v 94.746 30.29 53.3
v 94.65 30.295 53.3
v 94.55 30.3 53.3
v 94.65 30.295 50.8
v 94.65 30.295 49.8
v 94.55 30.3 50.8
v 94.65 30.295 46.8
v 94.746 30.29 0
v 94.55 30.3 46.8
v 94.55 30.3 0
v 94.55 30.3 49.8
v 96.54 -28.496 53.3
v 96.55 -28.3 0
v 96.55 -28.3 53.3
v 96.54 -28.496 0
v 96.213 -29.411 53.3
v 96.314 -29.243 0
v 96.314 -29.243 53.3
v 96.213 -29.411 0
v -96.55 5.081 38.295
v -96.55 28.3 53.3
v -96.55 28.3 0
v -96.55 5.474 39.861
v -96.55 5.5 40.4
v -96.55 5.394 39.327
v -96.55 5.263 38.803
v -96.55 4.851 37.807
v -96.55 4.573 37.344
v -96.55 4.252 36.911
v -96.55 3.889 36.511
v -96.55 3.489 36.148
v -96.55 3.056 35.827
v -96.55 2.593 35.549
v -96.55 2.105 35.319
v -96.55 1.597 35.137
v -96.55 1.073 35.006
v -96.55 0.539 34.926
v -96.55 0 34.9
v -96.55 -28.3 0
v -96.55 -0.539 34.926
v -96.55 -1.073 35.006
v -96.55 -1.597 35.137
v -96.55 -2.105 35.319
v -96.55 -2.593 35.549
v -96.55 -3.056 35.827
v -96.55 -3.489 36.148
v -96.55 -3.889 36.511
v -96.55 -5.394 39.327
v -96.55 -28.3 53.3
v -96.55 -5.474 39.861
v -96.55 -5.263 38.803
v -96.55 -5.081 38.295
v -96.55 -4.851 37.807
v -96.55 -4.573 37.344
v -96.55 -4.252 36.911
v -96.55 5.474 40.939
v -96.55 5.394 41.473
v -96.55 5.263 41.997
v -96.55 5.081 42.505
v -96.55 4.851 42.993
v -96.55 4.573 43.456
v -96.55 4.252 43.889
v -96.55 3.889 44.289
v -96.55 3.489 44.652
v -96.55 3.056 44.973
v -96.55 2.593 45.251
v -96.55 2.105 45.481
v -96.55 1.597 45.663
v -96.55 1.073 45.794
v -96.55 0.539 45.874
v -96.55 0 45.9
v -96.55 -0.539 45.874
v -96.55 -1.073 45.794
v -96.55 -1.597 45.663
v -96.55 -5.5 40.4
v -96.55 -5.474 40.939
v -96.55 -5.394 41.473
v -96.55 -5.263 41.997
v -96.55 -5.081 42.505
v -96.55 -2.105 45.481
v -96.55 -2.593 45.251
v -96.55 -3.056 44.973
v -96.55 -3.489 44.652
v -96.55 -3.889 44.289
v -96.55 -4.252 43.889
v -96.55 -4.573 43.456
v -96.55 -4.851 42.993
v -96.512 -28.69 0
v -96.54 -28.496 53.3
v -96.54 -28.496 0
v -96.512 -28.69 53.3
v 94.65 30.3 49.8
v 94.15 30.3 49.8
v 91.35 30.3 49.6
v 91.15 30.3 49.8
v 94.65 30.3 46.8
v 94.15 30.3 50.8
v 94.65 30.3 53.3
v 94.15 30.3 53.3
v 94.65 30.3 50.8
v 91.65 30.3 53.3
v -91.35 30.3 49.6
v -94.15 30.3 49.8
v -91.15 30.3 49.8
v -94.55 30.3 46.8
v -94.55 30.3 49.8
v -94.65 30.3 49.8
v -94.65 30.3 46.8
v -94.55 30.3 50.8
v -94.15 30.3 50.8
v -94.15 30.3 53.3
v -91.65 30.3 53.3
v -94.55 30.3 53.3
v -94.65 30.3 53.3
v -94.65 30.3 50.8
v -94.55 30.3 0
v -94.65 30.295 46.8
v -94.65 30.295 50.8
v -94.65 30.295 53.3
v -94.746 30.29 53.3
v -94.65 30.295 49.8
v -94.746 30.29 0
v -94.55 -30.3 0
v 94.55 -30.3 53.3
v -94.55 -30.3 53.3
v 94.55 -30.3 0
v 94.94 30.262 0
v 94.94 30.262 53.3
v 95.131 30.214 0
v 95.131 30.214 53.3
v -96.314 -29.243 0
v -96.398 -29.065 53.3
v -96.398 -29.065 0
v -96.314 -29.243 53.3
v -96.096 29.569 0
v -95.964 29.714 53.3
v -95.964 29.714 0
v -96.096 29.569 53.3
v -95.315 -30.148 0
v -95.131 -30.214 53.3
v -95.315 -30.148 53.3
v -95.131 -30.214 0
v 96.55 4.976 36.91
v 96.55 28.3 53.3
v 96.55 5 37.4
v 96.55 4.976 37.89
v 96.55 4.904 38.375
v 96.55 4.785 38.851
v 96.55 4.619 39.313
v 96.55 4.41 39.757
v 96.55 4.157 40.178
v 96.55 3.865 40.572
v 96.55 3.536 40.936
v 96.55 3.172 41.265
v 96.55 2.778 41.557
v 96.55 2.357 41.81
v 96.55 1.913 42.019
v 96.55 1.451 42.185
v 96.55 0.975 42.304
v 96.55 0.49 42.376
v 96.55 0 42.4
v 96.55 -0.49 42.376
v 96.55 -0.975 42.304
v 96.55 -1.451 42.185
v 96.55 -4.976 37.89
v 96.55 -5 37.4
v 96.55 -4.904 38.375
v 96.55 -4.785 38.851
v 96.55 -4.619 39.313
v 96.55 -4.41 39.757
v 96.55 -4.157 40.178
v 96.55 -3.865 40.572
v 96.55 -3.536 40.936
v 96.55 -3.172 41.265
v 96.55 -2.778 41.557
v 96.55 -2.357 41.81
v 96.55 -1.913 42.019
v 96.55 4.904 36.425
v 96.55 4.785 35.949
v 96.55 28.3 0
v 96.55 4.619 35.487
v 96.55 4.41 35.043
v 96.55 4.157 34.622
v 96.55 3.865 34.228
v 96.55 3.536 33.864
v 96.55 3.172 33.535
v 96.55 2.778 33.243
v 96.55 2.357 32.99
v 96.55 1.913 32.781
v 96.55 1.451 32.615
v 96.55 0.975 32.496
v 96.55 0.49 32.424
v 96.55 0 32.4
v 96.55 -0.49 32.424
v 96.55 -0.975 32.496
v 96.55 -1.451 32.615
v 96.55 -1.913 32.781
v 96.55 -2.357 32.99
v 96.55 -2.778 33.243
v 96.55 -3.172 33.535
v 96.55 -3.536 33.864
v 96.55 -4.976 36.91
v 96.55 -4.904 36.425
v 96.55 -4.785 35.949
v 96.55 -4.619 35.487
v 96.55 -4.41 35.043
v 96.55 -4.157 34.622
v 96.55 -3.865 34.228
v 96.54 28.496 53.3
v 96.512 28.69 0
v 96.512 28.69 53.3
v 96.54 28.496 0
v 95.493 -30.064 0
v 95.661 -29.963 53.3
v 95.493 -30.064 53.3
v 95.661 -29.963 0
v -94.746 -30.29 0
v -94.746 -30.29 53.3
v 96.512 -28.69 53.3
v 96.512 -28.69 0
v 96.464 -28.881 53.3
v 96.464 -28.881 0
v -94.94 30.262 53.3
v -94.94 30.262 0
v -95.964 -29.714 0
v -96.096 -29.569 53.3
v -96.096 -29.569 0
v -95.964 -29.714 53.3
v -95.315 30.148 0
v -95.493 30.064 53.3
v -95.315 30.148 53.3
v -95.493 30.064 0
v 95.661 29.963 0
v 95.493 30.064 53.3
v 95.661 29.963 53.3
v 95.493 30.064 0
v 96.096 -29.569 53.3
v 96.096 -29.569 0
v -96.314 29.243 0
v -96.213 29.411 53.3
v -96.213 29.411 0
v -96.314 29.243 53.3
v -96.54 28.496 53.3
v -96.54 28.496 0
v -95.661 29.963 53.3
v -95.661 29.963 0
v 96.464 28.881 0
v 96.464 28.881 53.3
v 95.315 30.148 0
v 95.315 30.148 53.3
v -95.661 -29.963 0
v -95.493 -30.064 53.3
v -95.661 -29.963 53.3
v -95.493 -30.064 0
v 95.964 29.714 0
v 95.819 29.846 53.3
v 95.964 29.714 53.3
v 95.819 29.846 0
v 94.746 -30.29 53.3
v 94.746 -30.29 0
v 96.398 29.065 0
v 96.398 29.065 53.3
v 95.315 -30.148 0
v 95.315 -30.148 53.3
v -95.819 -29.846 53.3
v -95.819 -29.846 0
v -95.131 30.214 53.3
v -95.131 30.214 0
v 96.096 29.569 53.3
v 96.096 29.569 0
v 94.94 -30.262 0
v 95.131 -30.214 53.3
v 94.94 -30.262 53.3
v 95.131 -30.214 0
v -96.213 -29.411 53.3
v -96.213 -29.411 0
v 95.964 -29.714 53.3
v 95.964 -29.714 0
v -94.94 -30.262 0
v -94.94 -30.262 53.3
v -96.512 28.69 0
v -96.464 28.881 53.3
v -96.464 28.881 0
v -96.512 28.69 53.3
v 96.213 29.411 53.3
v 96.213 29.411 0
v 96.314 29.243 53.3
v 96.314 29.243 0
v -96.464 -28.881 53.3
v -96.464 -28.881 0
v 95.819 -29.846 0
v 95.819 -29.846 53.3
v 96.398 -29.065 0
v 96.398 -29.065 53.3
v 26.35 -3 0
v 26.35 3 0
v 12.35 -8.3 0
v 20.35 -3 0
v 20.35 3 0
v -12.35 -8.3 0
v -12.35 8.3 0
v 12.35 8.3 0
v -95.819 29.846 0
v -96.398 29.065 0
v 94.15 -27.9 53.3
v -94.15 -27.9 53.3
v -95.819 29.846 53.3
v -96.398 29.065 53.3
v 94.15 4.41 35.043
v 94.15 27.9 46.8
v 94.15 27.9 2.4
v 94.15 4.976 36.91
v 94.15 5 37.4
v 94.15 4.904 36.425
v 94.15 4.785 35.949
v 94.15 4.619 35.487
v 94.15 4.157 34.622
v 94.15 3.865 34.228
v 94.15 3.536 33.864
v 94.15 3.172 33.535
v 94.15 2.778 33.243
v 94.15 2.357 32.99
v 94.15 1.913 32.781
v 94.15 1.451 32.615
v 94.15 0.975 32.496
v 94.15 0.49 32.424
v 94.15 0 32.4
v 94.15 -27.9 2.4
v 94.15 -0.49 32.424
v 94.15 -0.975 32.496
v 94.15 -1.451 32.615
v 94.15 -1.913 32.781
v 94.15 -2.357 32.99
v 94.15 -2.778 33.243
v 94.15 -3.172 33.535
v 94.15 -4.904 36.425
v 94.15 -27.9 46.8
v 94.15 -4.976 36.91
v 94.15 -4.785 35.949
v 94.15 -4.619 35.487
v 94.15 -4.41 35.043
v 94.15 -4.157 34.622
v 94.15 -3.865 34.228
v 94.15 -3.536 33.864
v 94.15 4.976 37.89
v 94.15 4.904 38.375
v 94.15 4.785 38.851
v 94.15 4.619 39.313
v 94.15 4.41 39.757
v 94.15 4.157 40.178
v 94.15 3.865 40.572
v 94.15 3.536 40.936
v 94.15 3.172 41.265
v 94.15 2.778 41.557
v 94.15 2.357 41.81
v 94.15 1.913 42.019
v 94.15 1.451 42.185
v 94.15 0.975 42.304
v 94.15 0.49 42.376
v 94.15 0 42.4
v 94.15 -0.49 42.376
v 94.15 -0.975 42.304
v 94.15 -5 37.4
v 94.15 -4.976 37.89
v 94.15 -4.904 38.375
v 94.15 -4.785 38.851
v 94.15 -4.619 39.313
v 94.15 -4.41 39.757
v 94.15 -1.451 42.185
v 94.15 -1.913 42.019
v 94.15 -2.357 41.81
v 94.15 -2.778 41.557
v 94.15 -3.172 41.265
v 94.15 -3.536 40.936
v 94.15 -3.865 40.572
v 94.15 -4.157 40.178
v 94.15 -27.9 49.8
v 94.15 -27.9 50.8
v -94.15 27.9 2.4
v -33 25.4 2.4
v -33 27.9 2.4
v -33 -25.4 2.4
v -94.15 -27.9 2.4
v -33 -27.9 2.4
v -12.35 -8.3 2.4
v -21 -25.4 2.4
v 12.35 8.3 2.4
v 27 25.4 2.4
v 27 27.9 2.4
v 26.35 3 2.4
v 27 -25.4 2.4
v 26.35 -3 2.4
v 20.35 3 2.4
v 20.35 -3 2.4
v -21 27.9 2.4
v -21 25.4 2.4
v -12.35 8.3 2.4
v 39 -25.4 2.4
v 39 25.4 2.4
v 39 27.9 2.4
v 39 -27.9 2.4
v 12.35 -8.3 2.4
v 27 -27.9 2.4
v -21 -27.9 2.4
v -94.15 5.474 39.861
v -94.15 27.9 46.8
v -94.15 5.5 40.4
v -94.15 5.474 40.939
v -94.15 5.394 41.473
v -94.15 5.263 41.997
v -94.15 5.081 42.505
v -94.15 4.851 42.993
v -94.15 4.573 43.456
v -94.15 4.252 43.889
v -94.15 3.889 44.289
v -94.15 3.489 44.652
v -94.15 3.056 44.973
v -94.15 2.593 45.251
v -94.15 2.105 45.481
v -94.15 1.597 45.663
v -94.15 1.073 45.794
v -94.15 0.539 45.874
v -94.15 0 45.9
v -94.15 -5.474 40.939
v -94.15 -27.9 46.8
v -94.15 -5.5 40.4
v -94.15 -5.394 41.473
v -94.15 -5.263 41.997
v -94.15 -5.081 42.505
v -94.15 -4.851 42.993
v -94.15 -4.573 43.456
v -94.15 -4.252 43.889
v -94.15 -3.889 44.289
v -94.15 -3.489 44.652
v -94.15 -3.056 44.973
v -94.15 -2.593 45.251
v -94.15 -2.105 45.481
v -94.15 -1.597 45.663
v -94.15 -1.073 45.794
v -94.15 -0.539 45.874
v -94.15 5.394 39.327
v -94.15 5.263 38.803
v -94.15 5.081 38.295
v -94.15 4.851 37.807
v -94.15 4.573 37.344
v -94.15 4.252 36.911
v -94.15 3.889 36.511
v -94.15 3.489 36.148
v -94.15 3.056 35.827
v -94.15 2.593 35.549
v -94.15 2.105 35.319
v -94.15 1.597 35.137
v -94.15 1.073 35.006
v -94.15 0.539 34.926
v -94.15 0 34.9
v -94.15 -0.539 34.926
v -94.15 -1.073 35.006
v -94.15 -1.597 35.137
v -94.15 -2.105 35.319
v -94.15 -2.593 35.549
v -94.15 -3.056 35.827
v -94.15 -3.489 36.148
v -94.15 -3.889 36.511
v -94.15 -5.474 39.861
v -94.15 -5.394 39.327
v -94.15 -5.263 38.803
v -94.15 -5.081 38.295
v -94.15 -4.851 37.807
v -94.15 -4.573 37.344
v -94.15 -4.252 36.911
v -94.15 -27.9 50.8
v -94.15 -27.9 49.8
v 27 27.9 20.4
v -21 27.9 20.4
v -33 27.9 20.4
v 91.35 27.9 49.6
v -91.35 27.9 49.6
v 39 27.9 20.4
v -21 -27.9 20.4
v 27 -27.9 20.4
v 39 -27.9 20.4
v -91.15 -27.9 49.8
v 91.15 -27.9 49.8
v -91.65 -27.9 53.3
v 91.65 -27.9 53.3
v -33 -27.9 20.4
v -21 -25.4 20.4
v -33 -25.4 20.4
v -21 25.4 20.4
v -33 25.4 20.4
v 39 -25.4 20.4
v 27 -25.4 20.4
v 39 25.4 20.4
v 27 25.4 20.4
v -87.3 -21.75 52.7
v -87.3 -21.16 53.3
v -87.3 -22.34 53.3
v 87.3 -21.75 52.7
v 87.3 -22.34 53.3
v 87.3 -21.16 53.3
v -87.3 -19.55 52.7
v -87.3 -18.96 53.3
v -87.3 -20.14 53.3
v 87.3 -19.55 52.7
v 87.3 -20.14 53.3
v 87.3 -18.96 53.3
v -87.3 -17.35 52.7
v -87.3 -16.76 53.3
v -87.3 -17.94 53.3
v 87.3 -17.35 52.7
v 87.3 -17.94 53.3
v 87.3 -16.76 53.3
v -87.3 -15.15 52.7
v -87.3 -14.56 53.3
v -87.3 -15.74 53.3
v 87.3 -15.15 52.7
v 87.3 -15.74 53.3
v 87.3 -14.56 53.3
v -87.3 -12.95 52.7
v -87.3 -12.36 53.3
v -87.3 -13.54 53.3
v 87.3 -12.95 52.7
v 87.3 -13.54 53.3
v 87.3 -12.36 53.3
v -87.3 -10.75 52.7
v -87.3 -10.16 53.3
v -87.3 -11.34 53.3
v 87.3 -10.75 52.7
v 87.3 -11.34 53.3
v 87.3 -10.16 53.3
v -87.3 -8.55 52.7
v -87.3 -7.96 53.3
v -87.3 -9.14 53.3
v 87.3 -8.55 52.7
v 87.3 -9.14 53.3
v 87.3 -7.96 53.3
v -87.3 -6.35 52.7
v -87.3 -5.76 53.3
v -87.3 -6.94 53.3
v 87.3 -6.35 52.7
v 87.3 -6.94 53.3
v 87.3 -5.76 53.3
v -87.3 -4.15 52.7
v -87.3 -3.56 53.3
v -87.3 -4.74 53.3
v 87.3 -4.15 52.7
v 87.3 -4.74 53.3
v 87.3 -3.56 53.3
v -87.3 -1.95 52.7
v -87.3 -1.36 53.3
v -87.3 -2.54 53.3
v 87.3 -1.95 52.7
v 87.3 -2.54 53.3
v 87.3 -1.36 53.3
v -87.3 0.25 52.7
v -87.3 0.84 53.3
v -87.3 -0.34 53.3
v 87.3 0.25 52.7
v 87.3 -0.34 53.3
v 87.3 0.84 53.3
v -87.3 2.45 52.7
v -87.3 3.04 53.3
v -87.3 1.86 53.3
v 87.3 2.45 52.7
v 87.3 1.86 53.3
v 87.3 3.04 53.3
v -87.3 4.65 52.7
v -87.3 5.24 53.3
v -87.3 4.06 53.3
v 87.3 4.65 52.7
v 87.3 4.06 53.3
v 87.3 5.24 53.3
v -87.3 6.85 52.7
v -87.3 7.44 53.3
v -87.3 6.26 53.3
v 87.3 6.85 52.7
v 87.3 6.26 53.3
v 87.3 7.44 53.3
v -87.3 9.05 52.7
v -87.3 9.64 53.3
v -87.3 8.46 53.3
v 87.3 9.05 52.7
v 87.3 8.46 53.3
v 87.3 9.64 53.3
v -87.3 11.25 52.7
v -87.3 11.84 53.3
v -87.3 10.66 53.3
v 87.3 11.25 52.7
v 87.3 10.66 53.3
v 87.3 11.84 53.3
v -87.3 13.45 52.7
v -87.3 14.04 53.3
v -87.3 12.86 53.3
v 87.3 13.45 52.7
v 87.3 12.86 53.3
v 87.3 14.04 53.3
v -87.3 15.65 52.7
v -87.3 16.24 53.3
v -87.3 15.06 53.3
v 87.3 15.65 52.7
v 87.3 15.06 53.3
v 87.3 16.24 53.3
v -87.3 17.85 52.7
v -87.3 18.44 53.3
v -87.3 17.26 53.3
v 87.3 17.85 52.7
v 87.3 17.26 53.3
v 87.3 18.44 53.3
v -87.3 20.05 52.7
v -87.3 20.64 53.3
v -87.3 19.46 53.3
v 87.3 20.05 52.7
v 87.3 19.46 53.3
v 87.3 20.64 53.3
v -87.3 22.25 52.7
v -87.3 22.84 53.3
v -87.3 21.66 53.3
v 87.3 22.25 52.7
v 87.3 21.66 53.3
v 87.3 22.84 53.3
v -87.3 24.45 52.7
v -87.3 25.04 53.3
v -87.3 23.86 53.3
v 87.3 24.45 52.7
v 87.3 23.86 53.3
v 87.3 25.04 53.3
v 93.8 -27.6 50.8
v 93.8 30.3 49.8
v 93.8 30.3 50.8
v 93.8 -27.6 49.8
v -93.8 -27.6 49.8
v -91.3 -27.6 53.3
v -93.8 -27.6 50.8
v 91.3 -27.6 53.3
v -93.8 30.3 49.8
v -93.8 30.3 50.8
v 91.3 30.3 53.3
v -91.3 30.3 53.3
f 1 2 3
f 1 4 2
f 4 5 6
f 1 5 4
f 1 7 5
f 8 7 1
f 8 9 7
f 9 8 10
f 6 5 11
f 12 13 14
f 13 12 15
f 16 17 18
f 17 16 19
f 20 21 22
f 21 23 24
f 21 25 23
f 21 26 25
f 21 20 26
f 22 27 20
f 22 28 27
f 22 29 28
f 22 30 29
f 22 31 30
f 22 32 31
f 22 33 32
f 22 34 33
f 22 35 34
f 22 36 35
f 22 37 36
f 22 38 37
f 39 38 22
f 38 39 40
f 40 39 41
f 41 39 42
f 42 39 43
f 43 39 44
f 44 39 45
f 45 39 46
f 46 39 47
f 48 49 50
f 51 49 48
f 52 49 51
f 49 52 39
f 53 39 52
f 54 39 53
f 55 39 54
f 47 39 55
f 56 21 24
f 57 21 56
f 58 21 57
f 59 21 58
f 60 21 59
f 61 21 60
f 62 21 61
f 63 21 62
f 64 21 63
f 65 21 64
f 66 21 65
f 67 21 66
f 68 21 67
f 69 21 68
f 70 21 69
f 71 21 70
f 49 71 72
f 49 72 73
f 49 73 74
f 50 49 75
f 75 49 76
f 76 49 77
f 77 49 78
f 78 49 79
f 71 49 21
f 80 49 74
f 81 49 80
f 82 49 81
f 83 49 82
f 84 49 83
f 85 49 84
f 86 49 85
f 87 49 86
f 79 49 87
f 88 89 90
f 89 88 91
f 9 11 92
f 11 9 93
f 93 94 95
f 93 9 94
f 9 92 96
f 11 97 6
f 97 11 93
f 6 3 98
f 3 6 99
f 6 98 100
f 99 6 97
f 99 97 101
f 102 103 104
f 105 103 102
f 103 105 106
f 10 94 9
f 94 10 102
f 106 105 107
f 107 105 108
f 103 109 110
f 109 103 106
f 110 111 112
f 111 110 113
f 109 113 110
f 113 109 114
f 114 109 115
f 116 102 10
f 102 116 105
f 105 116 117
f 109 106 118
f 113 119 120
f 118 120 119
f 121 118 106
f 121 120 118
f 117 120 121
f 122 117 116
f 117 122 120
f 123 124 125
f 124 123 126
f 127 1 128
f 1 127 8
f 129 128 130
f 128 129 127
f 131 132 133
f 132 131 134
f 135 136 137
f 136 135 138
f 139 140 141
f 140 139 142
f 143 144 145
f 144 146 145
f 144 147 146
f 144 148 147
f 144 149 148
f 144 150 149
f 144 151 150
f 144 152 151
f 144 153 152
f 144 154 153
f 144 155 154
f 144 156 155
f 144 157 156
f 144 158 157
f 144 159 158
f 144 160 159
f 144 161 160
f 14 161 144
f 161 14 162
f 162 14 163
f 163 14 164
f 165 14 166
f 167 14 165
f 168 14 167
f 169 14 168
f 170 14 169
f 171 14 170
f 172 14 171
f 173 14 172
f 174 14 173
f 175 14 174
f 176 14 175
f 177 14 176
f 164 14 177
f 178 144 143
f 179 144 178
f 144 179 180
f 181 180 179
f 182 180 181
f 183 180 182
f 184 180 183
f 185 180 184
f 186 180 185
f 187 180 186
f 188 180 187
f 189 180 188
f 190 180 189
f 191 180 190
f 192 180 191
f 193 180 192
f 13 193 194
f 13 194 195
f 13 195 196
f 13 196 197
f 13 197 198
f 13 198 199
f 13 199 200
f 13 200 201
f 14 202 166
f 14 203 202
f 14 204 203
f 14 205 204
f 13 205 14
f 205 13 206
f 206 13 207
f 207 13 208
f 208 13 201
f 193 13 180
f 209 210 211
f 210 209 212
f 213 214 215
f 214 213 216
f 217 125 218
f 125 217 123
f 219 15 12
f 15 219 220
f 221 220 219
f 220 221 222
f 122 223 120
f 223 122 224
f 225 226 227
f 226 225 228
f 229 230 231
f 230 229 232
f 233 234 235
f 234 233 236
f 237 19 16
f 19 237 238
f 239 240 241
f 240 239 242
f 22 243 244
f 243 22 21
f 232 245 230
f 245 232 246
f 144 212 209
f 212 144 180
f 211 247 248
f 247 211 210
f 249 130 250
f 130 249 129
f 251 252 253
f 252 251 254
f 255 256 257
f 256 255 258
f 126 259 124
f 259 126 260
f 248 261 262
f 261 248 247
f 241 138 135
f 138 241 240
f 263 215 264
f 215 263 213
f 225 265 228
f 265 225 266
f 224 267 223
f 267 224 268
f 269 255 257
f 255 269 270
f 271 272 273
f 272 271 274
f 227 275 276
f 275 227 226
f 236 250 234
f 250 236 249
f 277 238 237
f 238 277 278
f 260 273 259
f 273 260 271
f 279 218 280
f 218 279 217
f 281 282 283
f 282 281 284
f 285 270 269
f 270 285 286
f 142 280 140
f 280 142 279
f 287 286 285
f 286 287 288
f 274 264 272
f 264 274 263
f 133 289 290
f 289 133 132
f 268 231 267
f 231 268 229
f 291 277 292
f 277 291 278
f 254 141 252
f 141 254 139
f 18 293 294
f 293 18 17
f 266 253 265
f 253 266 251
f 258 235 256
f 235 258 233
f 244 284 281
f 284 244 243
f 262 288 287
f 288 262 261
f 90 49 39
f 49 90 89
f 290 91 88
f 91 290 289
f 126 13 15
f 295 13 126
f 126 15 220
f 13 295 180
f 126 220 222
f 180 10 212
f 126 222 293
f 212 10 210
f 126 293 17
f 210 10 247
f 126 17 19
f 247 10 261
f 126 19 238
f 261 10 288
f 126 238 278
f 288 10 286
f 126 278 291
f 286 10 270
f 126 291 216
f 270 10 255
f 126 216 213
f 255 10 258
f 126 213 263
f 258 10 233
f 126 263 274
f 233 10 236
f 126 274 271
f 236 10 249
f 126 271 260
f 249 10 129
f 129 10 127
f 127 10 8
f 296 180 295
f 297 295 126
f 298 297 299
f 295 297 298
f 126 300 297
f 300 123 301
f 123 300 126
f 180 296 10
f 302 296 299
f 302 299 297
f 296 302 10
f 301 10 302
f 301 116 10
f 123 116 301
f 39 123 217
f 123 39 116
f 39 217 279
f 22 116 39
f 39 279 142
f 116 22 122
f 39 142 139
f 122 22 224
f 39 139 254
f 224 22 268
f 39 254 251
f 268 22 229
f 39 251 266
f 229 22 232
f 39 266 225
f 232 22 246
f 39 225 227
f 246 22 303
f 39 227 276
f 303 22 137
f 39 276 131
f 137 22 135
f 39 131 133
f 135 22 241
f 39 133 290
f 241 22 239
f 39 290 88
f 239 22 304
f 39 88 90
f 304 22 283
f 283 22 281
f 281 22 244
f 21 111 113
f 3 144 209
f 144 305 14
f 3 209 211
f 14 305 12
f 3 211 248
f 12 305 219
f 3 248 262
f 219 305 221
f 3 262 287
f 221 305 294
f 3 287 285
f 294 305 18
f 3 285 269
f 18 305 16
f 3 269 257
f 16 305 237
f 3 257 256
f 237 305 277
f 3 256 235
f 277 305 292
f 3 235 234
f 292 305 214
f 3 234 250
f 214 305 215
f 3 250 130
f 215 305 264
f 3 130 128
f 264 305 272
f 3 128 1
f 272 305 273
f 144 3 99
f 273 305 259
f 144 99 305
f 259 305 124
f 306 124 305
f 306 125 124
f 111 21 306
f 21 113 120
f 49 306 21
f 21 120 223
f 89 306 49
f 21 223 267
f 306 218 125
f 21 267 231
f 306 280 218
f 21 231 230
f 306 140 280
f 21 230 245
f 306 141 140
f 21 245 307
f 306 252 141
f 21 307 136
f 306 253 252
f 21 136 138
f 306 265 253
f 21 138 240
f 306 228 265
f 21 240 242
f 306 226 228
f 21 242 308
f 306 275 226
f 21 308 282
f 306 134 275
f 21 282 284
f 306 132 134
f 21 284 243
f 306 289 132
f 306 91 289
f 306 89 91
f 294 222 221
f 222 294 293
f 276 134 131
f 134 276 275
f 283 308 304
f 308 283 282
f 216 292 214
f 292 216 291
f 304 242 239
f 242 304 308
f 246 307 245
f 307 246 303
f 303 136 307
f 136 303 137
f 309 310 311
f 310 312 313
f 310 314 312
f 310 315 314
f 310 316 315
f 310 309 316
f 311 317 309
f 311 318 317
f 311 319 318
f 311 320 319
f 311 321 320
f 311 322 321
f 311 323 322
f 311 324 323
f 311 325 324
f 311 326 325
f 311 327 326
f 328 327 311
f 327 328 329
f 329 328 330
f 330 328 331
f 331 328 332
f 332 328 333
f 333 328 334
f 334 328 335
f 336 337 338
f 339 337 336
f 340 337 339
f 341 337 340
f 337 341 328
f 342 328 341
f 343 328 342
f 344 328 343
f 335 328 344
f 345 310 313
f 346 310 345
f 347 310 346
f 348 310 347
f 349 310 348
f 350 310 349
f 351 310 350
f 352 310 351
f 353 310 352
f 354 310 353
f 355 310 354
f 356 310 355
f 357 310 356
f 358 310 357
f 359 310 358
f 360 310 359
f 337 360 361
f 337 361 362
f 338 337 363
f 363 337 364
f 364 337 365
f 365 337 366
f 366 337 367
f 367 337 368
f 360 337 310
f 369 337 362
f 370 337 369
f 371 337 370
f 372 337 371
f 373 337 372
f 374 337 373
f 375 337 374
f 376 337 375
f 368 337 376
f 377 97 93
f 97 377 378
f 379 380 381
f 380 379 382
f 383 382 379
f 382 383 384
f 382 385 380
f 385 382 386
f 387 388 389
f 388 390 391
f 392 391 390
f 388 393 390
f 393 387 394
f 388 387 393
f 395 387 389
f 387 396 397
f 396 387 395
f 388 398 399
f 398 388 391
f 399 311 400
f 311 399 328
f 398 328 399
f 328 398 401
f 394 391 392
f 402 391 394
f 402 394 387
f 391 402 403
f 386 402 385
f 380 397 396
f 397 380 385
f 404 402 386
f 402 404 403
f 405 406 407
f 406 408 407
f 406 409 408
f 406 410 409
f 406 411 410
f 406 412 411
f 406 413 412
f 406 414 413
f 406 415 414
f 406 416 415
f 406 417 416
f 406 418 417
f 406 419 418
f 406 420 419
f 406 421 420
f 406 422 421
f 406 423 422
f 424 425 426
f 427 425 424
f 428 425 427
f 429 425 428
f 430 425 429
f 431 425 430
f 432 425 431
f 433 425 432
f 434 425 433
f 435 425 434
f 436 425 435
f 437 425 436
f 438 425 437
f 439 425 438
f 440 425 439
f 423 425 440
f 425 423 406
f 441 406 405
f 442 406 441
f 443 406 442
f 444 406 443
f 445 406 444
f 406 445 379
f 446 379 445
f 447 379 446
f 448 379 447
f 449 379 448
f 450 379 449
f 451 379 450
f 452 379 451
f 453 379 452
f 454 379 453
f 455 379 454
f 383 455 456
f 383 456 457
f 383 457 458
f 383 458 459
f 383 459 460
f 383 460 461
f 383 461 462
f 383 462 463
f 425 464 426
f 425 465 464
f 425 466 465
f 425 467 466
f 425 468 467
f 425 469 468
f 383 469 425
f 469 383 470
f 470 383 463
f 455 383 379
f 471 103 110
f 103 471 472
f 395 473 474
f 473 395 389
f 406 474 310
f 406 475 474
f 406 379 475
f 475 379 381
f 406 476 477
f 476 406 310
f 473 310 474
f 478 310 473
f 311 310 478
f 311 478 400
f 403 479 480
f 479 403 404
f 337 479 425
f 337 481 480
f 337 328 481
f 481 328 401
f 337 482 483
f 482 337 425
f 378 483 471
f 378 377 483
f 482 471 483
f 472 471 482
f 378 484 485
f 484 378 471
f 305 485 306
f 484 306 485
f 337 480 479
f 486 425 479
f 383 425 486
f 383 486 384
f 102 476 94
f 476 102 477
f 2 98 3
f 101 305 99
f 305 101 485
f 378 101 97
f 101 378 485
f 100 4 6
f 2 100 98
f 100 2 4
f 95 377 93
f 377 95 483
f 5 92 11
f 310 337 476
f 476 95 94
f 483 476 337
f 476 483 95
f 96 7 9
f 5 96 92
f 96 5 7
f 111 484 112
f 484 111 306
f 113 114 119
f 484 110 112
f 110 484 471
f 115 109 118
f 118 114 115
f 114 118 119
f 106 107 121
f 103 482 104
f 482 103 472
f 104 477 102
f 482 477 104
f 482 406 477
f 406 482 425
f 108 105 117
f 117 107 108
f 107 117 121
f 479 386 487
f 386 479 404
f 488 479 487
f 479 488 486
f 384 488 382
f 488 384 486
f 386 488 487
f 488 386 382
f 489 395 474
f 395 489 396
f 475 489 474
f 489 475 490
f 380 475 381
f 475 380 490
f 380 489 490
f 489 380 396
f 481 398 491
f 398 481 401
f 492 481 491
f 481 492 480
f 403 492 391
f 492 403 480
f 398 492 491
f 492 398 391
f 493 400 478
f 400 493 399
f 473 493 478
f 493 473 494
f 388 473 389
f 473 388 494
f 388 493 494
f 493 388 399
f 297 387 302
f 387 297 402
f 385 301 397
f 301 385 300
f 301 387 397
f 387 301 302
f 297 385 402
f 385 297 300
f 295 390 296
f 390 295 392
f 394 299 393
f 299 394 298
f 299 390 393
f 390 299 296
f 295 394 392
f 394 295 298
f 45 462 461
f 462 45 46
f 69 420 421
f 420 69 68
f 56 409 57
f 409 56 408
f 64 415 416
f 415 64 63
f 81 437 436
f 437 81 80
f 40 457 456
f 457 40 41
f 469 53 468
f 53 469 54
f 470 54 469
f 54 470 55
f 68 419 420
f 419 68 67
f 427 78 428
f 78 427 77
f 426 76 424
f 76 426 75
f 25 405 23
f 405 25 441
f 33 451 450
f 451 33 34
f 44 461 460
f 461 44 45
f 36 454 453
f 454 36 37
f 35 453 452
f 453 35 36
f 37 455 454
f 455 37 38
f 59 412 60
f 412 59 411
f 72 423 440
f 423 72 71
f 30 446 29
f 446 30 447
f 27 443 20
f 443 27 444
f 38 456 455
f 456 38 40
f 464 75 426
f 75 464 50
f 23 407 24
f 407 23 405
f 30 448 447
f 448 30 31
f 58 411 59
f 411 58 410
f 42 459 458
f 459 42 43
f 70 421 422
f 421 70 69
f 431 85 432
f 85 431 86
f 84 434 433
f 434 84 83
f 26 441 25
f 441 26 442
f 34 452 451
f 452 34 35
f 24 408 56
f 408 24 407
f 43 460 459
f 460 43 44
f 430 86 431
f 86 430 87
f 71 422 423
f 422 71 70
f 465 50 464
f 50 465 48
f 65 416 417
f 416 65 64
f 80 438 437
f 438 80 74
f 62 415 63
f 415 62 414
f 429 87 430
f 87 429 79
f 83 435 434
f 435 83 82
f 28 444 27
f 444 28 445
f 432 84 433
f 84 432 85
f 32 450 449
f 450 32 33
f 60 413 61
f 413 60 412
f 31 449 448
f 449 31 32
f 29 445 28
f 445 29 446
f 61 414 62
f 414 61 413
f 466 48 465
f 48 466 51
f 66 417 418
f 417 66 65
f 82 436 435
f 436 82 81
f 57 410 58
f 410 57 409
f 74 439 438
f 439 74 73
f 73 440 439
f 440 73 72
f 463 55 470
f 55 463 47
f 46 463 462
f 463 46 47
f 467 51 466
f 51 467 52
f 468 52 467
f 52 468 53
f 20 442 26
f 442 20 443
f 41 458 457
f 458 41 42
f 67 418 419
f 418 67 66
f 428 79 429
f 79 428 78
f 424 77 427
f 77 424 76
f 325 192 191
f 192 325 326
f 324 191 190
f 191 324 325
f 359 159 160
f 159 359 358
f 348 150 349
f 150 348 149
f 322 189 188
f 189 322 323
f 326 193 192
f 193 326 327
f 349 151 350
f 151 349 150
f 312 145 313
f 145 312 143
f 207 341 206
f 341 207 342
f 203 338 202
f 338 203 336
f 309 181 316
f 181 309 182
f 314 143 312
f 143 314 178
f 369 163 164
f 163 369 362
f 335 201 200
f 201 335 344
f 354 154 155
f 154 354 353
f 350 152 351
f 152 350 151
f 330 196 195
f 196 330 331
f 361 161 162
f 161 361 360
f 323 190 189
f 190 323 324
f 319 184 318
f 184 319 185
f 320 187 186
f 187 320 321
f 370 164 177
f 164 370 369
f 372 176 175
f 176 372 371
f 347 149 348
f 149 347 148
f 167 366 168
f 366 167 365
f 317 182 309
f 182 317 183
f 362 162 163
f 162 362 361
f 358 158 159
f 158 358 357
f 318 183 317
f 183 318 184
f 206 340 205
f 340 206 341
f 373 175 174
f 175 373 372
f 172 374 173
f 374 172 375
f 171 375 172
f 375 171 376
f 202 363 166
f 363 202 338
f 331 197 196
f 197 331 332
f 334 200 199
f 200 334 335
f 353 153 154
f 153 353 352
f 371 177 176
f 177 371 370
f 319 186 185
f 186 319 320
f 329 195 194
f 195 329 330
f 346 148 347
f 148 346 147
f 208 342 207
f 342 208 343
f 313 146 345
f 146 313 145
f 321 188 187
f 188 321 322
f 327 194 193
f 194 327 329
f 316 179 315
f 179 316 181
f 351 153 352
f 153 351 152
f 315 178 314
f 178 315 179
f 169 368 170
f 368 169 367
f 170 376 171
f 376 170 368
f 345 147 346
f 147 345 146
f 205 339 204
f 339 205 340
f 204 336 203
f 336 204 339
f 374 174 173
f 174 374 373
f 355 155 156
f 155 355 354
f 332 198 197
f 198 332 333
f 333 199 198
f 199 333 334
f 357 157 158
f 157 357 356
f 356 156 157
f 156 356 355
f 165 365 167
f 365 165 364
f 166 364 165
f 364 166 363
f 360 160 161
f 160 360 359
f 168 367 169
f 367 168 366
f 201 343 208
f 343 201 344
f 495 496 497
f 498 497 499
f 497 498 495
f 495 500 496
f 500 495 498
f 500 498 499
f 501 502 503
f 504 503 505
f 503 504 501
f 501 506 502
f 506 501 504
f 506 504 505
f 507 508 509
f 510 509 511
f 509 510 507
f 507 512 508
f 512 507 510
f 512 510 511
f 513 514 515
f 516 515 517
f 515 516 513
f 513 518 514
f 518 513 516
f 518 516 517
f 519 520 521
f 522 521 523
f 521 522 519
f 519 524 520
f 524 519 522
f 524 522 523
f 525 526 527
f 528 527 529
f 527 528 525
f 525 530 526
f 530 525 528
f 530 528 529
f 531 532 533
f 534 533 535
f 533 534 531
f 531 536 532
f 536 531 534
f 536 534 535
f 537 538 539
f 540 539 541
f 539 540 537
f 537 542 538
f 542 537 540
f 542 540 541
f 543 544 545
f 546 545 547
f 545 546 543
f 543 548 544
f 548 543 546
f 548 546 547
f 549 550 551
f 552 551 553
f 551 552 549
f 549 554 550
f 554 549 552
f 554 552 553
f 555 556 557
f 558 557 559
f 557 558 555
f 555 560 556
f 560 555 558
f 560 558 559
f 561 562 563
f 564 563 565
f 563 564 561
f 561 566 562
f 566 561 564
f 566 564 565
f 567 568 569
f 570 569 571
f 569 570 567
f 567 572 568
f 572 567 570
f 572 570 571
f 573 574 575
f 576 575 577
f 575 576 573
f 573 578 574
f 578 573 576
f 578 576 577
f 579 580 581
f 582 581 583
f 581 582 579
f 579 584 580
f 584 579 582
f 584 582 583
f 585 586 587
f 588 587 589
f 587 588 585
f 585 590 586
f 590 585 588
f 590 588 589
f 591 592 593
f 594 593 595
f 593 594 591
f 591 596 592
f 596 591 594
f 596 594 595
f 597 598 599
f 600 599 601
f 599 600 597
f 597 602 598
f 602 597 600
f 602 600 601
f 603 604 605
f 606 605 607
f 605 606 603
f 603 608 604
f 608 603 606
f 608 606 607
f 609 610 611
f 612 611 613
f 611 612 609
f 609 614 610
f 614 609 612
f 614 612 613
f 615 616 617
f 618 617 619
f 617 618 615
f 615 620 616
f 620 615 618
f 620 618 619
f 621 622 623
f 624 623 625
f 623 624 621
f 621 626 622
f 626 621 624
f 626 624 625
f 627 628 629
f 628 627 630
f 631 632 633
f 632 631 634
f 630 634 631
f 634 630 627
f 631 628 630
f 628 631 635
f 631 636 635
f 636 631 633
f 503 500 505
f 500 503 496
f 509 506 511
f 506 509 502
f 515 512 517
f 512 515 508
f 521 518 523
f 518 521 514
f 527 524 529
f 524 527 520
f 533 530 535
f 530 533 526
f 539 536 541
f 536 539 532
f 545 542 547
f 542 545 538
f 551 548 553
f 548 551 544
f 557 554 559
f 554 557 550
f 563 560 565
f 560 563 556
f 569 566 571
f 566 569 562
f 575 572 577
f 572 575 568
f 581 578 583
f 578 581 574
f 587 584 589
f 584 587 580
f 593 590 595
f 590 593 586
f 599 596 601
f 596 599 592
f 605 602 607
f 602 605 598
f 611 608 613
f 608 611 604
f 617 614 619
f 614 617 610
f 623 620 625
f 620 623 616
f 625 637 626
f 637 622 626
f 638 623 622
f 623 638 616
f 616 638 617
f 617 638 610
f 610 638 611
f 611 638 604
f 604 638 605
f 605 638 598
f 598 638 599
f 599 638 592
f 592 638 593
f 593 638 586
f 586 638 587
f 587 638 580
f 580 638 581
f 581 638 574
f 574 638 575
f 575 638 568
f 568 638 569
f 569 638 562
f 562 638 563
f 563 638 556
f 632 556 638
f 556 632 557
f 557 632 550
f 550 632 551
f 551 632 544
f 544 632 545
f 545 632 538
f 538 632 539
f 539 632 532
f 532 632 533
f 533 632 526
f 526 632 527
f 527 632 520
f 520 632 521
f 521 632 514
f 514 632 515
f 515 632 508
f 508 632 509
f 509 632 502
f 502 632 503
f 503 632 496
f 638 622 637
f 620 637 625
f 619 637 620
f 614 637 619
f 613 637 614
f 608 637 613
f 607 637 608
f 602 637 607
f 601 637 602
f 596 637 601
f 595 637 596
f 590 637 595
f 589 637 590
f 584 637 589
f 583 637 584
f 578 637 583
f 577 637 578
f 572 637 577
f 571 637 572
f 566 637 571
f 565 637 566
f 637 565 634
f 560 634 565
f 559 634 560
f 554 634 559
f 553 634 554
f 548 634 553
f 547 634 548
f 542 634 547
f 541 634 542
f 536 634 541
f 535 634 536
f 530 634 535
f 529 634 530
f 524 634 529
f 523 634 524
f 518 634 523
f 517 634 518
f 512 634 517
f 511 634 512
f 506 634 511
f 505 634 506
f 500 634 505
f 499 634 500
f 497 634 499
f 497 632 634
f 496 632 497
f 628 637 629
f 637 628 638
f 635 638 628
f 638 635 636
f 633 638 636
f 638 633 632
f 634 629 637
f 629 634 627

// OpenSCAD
// libcounter enclosure
// Two-part case (body + sliding lid) for a full-size 830 point breadboard
// carrying the ESP32-S3 DevKit, SSD1306 OLED, a push button, a 12V DC jack and
// an ultrasonic sensor cable.
//
// The breadboard is mounted with its component side facing the FRONT (the
// floor of the body), so the OLED looks out through the window in the floor.
// The back of the breadboard faces the lid.
//
//   Body seen from the front (outside of the floor), X to the right:
//
//   +-----------------------------------------------------+
//   |                                                     |
//   |  12V      [ screen ]  []button               sensor |
//   |  jack                                        cable  |
//   |                                                     |
//   +-----------------------------------------------------+   <- lid slides in
//                                                                from this long
//                                                                side (+Y)
//
// The lid is a "drawer": it slides along rails in the two SHORT end walls
// (along Y), entering from the +Y long side only. The opposite long wall (-Y)
// is the stop. The lid stays inside the outline of the body and has a grooved
// grip texture on its outer face.
//
// Printing: render with part = "base" and part = "lid" and export each as STL.
// Both parts are oriented ready to print (no supports needed).
// Everything is in millimetres.

/* [Part to render] */
// "base", "lid", "plate" (both parts side by side, for a single 3MF) or
// "assembly" (preview only, lid shown in place)
part = "assembly"; // [base, lid, plate, assembly]

/* [Breadboard] */
bb_length    = 165.1;  // full-size breadboard, long side
bb_width     = 54.6;   // full-size breadboard, short side
bb_thickness = 9.0;    // incl. adhesive backing
bb_clearance = 0.6;    // gap on each side so it fits after printing

/* [Case] */
wall             = 2.4;  // side wall thickness
floor_t          = 2.4;  // front plate (floor) thickness
component_height = 18;   // height of the 4 wall pads = space under the breadboard. Keep LOW:
                         // the breadboard rests on these, so taller pads = less room above
top_height       = 20;   // free height ABOVE the breadboard back (power module etc.), up to the lid
bb_slack         = 0.4;  // extra play between breadboard back and lid
end_zone_jack    = 14;   // free space between breadboard and the 12V jack wall (-X)
end_zone_cable   = 8;    // free space between breadboard and the sensor cable wall (+X)

/* [Sliding lid] */
lid_t        = 3.5;    // lid thickness (also the height of the slide rails)
lid_vert     = 1;      // vertical part of the lid edge, the rest is a 45 deg chamfer
ledge_w      = 3;      // width of the ledge the lid rests on
lid_gap      = 0.35;   // clearance between lid and rails (increase if too tight)
lid_end_gap  = 0.3;    // clearance between lid and the closed (-Y) wall
slide        = 0;      // assembly preview only: how far the lid is pulled out (+Y)

/* [Grip texture on lid] */
grip_pitch   = 2.2;    // distance between grooves
grip_w       = 1.2;    // groove width at the surface
grip_depth   = 0.6;    // groove depth (V shaped)
grip_margin  = 4;      // untextured border around the lid face

/* [Screen] (in the front plate, positions from its centre) */
screen_w     = 24.7;   // along X
screen_h     = 16.6;   // along Y
screen_x     = 0;
screen_y     = 0;

/* [Push button] (in the front plate) */
button_size  = 6;      // square hole
button_gap   = 8;      // distance between screen edge and button hole edge
// button sits toward +X (sensor side) of the screen; change to put it elsewhere
button_x     = screen_x + screen_w / 2 + button_gap + button_size / 2;
button_y     = screen_y;

/* [12V DC jack] (left end wall, -X) */
jack_d       = 11;     // hole diameter (adjust to your jack)
jack_y       = 0;      // offset along Y
jack_z       = 11;     // centre height above the breadboard surface (hole top must stay under the lid ledge)

/* [Sensor cable] (right end wall, +X) */
cable_d      = 10;
cable_y      = 0;
cable_z      = 8;      // centre height above the breadboard surface

/* [Breadboard holders] */
pad_reach    = 2.5;    // how far the support pads reach in from the long walls
pad_len      = 12;     // pad length along X
pad_x        = 30;     // pads sit at +-pad_x from the breadboard centre, kept well
                       // away from the ends where the power module plugs in

$fn = 64;
eps = 0.01;

// ---- derived ---------------------------------------------------------------
in_l    = bb_length + 2 * bb_clearance + end_zone_jack + end_zone_cable;  // interior X
in_w    = bb_width  + 2 * bb_clearance;                 // interior Y
out_l   = in_l + 2 * wall;
out_w   = in_w + 2 * wall;
Xi      = in_l / 2;                                     // interior half length
bb_cx   = (end_zone_jack - end_zone_cable) / 2;         // breadboard centre X
Yi      = in_w / 2;                                     // interior half width
bb_front_z = floor_t + component_height;                // breadboard front face
bb_back_z  = bb_front_z + bb_thickness;                 // breadboard top surface
zl      = bb_back_z + bb_slack + top_height;            // ledge top / lid bottom
total_h = zl + lid_t;                                   // top of walls = top of lid
lid_y0  = -Yi + lid_end_gap;                            // closed end of lid
lid_y1  = out_w / 2;                                    // open end, flush with body

module rounded_box(l, w, h, r = 2) {
    hull()
        for (sx = [-1, 1], sy = [-1, 1])
            translate([sx * (l / 2 - r), sy * (w / 2 - r), 0])
                cylinder(r = r, h = h);
}

// Extrude a 2D profile given as [x, z] points along Y from y0 to y1.
module along_y(y0, y1) {
    translate([0, y1, 0]) rotate([90, 0, 0])
        linear_extrude(height = y1 - y0) children();
}

// ---- body ------------------------------------------------------------------
// Slide rails (per short end wall, +X side shown, mirrored for -X):
//   * ledge: horizontal shelf the lid rests on, 45 deg gusset underneath
//   * rail : triangle above the lid edge, 45 deg underside, holds the lid in
// Both are printable without supports. The +Y long wall is cut down to the
// ledge so the lid slides in from that side only; the -Y wall is the stop.
module rails() {
    for (m = [0, 1]) mirror([m, 0, 0])
        along_y(-Yi - 0.5, out_w / 2) {
            // ledge
            polygon([[Xi + 0.5, zl - ledge_w], [Xi, zl - ledge_w],
                     [Xi - ledge_w, zl], [Xi + 0.5, zl]]);
            // hold-down rail
            polygon([[Xi + 0.5, zl + lid_vert], [Xi, zl + lid_vert],
                     [Xi - (lid_t - lid_vert), total_h],
                     [Xi + 0.5, total_h]]);
        }
}

module base_part() {
    difference() {
        union() {
            difference() {
                rounded_box(out_l, out_w, total_h);
                // interior
                translate([-Xi, -Yi, floor_t])
                    cube([in_l, in_w, total_h]);
                // open side: lower the +Y wall to just below the lid
                translate([-Xi, Yi - 0.01, zl - 0.2])
                    cube([in_l, wall + 1, lid_t + 1]);
            }
            rails();

            // support pads: breadboard front face rests on these
            for (sx = [-1, 1], sy = [-1, 1])
                translate([bb_cx + sx * pad_x - pad_len / 2,
                           sy > 0 ? Yi - pad_reach : -Yi - 0.5, floor_t - eps])
                    cube([pad_len, pad_reach + 0.5, component_height + eps]);
        }

        // screen window
        translate([screen_x - screen_w / 2, screen_y - screen_h / 2, -1])
            cube([screen_w, screen_h, floor_t + 2]);

        // push button hole
        translate([button_x - button_size / 2, button_y - button_size / 2, -1])
            cube([button_size, button_size, floor_t + 2]);

        // 12V DC jack hole, -X wall
        translate([-out_l / 2 - 1, jack_y, bb_back_z + jack_z])
            rotate([0, 90, 0]) cylinder(d = jack_d, h = wall + 2);

        // sensor cable hole, +X wall
        translate([out_l / 2 - wall - 1, cable_y, bb_back_z + cable_z])
            rotate([0, 90, 0]) cylinder(d = cable_d, h = wall + 2);
    }
}

// ---- lid -------------------------------------------------------------------
// Local coordinates: bottom at z = 0, Y in case coordinates (slides along +Y).
// Printed as modelled: the wide underside sits on the bed, no supports.
module lid_part() {
    hw  = Xi - lid_gap;                 // half width at the bottom
    hwt = hw - (lid_t - lid_vert);      // half width at the top
    gx  = hwt - grip_margin;            // grooves run over |x| < gx
    n   = floor((lid_y1 - lid_y0 - 2 * grip_margin) / grip_pitch);
    gy0 = (lid_y0 + lid_y1) / 2 - (n - 1) * grip_pitch / 2;
    difference() {
        along_y(lid_y0, lid_y1)
            polygon([[-hw, 0], [hw, 0], [hw, lid_vert], [hwt, lid_t],
                     [-hwt, lid_t], [-hw, lid_vert]]);

        // grip grooves (recessed, so the lid never rises above the body)
        for (i = [0 : n - 1])
            translate([-gx, gy0 + i * grip_pitch, 0])
                rotate([90, 0, 90]) linear_extrude(height = 2 * gx)
                    polygon([[-grip_w / 2, lid_t + eps],
                             [0, lid_t - grip_depth],
                             [grip_w / 2, lid_t + eps]]);
    }
}

// ---- output ----------------------------------------------------------------
if (part == "base") {
    base_part();
} else if (part == "lid") {
    lid_part();
} else if (part == "plate") {
    // both parts laid out next to each other on one print bed
    translate([0, -(out_w / 2 + 3), 0]) base_part();
    translate([0, 3 - lid_y0, 0])
        lid_part();
} else {
    base_part();
    translate([0, slide, zl]) color("lightblue") lid_part();
}
